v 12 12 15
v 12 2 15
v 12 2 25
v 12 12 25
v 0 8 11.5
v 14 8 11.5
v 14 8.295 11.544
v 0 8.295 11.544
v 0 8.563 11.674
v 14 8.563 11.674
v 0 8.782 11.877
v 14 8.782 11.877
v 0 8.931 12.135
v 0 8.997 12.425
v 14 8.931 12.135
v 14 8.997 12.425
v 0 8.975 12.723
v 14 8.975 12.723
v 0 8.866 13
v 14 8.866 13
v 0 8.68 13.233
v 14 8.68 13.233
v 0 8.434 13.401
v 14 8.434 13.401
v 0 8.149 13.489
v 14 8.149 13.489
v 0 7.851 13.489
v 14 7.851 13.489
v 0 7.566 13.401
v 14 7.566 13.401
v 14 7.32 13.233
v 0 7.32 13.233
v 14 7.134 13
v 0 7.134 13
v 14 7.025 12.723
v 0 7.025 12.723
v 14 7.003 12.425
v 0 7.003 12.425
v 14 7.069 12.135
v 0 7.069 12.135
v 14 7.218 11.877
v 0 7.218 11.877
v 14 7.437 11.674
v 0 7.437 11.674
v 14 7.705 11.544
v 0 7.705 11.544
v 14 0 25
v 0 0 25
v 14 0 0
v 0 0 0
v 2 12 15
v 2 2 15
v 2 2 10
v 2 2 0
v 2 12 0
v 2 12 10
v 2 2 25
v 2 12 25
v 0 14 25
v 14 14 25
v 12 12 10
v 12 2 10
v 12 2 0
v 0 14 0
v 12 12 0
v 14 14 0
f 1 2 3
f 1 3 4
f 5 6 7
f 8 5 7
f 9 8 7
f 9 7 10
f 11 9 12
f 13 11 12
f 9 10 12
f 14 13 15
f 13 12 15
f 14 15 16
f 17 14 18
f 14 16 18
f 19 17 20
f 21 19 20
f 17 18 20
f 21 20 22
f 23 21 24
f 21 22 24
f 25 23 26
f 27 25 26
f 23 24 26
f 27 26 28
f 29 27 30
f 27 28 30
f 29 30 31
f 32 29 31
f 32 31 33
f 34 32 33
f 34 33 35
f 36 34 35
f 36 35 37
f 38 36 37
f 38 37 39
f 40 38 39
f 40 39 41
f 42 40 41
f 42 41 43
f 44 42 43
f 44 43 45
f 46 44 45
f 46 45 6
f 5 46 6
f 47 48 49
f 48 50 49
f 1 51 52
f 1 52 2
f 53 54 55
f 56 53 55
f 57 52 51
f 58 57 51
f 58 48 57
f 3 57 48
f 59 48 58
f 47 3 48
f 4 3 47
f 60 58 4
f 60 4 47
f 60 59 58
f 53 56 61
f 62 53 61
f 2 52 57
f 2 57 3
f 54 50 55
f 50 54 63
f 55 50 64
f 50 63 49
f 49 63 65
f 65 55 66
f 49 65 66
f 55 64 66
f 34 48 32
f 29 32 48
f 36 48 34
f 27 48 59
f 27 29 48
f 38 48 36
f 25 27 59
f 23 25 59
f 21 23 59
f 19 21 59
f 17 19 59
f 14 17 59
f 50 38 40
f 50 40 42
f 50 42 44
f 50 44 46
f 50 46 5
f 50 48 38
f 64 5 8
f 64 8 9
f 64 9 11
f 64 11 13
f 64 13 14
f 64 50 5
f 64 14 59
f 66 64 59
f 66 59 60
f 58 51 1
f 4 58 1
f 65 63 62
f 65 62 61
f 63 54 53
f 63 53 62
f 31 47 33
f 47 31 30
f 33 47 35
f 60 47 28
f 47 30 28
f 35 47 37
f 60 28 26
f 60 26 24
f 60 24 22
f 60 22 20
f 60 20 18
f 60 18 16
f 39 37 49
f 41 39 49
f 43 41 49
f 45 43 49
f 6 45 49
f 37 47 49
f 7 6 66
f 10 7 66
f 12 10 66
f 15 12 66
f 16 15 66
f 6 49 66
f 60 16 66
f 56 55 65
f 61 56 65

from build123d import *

# Parameters (mm, degrees)
SKETCH_1_W          = 14
SKETCH_1_H          = 14
SKETCH_1_W_2        = 10
SKETCH_1_H_2        = 10
EXTRUDE_1_DEPTH     = 10
SKETCH_2_W          = 14
SKETCH_2_H          = 14
EXTRUDE_2_DEPTH     = 5
SKETCH_3_W          = 14
SKETCH_3_H          = 14
SKETCH_3_W_2        = 10
SKETCH_3_H_2        = 10
EXTRUDE_3_DEPTH     = 10
SKETCH_6_R          = 1
CUT_EXTRUDE_1_DEPTH = 16


with BuildPart() as part:
    # 草图1 → 凸台-拉伸1 (new body)
    with BuildSketch(Plane.XY):
        with Locations((7, 7)):
            Rectangle(SKETCH_1_W, SKETCH_1_H)
        with Locations((7, 7)):
            Rectangle(SKETCH_1_W_2, SKETCH_1_H_2, mode=Mode.SUBTRACT)
    extrude(amount=EXTRUDE_1_DEPTH)

    # 草图2 → 凸台-拉伸2 (add)
    with BuildSketch(Plane.XY.offset(10)):
        with Locations((7, 7)):
            Rectangle(SKETCH_2_W, SKETCH_2_H)
    extrude(amount=EXTRUDE_2_DEPTH)

    # 草图3 → 凸台-拉伸3 (add)
    with BuildSketch(Plane.XY.offset(15)):
        with Locations((7, 7)):
            Rectangle(SKETCH_3_W, SKETCH_3_H)
        with Locations((7, 7)):
            Rectangle(SKETCH_3_W_2, SKETCH_3_H_2, mode=Mode.SUBTRACT)
    extrude(amount=EXTRUDE_3_DEPTH)

    # 草图6 → 切除-拉伸1 (cut)
    with BuildSketch(Plane(origin=(14, 0, 0), x_dir=(0, 0, -1), z_dir=(1, 0, 0))):
        with Locations((-12.5, 8)):
            Circle(SKETCH_6_R)
    extrude(amount=-CUT_EXTRUDE_1_DEPTH, mode=Mode.SUBTRACT)


solid = part.part
